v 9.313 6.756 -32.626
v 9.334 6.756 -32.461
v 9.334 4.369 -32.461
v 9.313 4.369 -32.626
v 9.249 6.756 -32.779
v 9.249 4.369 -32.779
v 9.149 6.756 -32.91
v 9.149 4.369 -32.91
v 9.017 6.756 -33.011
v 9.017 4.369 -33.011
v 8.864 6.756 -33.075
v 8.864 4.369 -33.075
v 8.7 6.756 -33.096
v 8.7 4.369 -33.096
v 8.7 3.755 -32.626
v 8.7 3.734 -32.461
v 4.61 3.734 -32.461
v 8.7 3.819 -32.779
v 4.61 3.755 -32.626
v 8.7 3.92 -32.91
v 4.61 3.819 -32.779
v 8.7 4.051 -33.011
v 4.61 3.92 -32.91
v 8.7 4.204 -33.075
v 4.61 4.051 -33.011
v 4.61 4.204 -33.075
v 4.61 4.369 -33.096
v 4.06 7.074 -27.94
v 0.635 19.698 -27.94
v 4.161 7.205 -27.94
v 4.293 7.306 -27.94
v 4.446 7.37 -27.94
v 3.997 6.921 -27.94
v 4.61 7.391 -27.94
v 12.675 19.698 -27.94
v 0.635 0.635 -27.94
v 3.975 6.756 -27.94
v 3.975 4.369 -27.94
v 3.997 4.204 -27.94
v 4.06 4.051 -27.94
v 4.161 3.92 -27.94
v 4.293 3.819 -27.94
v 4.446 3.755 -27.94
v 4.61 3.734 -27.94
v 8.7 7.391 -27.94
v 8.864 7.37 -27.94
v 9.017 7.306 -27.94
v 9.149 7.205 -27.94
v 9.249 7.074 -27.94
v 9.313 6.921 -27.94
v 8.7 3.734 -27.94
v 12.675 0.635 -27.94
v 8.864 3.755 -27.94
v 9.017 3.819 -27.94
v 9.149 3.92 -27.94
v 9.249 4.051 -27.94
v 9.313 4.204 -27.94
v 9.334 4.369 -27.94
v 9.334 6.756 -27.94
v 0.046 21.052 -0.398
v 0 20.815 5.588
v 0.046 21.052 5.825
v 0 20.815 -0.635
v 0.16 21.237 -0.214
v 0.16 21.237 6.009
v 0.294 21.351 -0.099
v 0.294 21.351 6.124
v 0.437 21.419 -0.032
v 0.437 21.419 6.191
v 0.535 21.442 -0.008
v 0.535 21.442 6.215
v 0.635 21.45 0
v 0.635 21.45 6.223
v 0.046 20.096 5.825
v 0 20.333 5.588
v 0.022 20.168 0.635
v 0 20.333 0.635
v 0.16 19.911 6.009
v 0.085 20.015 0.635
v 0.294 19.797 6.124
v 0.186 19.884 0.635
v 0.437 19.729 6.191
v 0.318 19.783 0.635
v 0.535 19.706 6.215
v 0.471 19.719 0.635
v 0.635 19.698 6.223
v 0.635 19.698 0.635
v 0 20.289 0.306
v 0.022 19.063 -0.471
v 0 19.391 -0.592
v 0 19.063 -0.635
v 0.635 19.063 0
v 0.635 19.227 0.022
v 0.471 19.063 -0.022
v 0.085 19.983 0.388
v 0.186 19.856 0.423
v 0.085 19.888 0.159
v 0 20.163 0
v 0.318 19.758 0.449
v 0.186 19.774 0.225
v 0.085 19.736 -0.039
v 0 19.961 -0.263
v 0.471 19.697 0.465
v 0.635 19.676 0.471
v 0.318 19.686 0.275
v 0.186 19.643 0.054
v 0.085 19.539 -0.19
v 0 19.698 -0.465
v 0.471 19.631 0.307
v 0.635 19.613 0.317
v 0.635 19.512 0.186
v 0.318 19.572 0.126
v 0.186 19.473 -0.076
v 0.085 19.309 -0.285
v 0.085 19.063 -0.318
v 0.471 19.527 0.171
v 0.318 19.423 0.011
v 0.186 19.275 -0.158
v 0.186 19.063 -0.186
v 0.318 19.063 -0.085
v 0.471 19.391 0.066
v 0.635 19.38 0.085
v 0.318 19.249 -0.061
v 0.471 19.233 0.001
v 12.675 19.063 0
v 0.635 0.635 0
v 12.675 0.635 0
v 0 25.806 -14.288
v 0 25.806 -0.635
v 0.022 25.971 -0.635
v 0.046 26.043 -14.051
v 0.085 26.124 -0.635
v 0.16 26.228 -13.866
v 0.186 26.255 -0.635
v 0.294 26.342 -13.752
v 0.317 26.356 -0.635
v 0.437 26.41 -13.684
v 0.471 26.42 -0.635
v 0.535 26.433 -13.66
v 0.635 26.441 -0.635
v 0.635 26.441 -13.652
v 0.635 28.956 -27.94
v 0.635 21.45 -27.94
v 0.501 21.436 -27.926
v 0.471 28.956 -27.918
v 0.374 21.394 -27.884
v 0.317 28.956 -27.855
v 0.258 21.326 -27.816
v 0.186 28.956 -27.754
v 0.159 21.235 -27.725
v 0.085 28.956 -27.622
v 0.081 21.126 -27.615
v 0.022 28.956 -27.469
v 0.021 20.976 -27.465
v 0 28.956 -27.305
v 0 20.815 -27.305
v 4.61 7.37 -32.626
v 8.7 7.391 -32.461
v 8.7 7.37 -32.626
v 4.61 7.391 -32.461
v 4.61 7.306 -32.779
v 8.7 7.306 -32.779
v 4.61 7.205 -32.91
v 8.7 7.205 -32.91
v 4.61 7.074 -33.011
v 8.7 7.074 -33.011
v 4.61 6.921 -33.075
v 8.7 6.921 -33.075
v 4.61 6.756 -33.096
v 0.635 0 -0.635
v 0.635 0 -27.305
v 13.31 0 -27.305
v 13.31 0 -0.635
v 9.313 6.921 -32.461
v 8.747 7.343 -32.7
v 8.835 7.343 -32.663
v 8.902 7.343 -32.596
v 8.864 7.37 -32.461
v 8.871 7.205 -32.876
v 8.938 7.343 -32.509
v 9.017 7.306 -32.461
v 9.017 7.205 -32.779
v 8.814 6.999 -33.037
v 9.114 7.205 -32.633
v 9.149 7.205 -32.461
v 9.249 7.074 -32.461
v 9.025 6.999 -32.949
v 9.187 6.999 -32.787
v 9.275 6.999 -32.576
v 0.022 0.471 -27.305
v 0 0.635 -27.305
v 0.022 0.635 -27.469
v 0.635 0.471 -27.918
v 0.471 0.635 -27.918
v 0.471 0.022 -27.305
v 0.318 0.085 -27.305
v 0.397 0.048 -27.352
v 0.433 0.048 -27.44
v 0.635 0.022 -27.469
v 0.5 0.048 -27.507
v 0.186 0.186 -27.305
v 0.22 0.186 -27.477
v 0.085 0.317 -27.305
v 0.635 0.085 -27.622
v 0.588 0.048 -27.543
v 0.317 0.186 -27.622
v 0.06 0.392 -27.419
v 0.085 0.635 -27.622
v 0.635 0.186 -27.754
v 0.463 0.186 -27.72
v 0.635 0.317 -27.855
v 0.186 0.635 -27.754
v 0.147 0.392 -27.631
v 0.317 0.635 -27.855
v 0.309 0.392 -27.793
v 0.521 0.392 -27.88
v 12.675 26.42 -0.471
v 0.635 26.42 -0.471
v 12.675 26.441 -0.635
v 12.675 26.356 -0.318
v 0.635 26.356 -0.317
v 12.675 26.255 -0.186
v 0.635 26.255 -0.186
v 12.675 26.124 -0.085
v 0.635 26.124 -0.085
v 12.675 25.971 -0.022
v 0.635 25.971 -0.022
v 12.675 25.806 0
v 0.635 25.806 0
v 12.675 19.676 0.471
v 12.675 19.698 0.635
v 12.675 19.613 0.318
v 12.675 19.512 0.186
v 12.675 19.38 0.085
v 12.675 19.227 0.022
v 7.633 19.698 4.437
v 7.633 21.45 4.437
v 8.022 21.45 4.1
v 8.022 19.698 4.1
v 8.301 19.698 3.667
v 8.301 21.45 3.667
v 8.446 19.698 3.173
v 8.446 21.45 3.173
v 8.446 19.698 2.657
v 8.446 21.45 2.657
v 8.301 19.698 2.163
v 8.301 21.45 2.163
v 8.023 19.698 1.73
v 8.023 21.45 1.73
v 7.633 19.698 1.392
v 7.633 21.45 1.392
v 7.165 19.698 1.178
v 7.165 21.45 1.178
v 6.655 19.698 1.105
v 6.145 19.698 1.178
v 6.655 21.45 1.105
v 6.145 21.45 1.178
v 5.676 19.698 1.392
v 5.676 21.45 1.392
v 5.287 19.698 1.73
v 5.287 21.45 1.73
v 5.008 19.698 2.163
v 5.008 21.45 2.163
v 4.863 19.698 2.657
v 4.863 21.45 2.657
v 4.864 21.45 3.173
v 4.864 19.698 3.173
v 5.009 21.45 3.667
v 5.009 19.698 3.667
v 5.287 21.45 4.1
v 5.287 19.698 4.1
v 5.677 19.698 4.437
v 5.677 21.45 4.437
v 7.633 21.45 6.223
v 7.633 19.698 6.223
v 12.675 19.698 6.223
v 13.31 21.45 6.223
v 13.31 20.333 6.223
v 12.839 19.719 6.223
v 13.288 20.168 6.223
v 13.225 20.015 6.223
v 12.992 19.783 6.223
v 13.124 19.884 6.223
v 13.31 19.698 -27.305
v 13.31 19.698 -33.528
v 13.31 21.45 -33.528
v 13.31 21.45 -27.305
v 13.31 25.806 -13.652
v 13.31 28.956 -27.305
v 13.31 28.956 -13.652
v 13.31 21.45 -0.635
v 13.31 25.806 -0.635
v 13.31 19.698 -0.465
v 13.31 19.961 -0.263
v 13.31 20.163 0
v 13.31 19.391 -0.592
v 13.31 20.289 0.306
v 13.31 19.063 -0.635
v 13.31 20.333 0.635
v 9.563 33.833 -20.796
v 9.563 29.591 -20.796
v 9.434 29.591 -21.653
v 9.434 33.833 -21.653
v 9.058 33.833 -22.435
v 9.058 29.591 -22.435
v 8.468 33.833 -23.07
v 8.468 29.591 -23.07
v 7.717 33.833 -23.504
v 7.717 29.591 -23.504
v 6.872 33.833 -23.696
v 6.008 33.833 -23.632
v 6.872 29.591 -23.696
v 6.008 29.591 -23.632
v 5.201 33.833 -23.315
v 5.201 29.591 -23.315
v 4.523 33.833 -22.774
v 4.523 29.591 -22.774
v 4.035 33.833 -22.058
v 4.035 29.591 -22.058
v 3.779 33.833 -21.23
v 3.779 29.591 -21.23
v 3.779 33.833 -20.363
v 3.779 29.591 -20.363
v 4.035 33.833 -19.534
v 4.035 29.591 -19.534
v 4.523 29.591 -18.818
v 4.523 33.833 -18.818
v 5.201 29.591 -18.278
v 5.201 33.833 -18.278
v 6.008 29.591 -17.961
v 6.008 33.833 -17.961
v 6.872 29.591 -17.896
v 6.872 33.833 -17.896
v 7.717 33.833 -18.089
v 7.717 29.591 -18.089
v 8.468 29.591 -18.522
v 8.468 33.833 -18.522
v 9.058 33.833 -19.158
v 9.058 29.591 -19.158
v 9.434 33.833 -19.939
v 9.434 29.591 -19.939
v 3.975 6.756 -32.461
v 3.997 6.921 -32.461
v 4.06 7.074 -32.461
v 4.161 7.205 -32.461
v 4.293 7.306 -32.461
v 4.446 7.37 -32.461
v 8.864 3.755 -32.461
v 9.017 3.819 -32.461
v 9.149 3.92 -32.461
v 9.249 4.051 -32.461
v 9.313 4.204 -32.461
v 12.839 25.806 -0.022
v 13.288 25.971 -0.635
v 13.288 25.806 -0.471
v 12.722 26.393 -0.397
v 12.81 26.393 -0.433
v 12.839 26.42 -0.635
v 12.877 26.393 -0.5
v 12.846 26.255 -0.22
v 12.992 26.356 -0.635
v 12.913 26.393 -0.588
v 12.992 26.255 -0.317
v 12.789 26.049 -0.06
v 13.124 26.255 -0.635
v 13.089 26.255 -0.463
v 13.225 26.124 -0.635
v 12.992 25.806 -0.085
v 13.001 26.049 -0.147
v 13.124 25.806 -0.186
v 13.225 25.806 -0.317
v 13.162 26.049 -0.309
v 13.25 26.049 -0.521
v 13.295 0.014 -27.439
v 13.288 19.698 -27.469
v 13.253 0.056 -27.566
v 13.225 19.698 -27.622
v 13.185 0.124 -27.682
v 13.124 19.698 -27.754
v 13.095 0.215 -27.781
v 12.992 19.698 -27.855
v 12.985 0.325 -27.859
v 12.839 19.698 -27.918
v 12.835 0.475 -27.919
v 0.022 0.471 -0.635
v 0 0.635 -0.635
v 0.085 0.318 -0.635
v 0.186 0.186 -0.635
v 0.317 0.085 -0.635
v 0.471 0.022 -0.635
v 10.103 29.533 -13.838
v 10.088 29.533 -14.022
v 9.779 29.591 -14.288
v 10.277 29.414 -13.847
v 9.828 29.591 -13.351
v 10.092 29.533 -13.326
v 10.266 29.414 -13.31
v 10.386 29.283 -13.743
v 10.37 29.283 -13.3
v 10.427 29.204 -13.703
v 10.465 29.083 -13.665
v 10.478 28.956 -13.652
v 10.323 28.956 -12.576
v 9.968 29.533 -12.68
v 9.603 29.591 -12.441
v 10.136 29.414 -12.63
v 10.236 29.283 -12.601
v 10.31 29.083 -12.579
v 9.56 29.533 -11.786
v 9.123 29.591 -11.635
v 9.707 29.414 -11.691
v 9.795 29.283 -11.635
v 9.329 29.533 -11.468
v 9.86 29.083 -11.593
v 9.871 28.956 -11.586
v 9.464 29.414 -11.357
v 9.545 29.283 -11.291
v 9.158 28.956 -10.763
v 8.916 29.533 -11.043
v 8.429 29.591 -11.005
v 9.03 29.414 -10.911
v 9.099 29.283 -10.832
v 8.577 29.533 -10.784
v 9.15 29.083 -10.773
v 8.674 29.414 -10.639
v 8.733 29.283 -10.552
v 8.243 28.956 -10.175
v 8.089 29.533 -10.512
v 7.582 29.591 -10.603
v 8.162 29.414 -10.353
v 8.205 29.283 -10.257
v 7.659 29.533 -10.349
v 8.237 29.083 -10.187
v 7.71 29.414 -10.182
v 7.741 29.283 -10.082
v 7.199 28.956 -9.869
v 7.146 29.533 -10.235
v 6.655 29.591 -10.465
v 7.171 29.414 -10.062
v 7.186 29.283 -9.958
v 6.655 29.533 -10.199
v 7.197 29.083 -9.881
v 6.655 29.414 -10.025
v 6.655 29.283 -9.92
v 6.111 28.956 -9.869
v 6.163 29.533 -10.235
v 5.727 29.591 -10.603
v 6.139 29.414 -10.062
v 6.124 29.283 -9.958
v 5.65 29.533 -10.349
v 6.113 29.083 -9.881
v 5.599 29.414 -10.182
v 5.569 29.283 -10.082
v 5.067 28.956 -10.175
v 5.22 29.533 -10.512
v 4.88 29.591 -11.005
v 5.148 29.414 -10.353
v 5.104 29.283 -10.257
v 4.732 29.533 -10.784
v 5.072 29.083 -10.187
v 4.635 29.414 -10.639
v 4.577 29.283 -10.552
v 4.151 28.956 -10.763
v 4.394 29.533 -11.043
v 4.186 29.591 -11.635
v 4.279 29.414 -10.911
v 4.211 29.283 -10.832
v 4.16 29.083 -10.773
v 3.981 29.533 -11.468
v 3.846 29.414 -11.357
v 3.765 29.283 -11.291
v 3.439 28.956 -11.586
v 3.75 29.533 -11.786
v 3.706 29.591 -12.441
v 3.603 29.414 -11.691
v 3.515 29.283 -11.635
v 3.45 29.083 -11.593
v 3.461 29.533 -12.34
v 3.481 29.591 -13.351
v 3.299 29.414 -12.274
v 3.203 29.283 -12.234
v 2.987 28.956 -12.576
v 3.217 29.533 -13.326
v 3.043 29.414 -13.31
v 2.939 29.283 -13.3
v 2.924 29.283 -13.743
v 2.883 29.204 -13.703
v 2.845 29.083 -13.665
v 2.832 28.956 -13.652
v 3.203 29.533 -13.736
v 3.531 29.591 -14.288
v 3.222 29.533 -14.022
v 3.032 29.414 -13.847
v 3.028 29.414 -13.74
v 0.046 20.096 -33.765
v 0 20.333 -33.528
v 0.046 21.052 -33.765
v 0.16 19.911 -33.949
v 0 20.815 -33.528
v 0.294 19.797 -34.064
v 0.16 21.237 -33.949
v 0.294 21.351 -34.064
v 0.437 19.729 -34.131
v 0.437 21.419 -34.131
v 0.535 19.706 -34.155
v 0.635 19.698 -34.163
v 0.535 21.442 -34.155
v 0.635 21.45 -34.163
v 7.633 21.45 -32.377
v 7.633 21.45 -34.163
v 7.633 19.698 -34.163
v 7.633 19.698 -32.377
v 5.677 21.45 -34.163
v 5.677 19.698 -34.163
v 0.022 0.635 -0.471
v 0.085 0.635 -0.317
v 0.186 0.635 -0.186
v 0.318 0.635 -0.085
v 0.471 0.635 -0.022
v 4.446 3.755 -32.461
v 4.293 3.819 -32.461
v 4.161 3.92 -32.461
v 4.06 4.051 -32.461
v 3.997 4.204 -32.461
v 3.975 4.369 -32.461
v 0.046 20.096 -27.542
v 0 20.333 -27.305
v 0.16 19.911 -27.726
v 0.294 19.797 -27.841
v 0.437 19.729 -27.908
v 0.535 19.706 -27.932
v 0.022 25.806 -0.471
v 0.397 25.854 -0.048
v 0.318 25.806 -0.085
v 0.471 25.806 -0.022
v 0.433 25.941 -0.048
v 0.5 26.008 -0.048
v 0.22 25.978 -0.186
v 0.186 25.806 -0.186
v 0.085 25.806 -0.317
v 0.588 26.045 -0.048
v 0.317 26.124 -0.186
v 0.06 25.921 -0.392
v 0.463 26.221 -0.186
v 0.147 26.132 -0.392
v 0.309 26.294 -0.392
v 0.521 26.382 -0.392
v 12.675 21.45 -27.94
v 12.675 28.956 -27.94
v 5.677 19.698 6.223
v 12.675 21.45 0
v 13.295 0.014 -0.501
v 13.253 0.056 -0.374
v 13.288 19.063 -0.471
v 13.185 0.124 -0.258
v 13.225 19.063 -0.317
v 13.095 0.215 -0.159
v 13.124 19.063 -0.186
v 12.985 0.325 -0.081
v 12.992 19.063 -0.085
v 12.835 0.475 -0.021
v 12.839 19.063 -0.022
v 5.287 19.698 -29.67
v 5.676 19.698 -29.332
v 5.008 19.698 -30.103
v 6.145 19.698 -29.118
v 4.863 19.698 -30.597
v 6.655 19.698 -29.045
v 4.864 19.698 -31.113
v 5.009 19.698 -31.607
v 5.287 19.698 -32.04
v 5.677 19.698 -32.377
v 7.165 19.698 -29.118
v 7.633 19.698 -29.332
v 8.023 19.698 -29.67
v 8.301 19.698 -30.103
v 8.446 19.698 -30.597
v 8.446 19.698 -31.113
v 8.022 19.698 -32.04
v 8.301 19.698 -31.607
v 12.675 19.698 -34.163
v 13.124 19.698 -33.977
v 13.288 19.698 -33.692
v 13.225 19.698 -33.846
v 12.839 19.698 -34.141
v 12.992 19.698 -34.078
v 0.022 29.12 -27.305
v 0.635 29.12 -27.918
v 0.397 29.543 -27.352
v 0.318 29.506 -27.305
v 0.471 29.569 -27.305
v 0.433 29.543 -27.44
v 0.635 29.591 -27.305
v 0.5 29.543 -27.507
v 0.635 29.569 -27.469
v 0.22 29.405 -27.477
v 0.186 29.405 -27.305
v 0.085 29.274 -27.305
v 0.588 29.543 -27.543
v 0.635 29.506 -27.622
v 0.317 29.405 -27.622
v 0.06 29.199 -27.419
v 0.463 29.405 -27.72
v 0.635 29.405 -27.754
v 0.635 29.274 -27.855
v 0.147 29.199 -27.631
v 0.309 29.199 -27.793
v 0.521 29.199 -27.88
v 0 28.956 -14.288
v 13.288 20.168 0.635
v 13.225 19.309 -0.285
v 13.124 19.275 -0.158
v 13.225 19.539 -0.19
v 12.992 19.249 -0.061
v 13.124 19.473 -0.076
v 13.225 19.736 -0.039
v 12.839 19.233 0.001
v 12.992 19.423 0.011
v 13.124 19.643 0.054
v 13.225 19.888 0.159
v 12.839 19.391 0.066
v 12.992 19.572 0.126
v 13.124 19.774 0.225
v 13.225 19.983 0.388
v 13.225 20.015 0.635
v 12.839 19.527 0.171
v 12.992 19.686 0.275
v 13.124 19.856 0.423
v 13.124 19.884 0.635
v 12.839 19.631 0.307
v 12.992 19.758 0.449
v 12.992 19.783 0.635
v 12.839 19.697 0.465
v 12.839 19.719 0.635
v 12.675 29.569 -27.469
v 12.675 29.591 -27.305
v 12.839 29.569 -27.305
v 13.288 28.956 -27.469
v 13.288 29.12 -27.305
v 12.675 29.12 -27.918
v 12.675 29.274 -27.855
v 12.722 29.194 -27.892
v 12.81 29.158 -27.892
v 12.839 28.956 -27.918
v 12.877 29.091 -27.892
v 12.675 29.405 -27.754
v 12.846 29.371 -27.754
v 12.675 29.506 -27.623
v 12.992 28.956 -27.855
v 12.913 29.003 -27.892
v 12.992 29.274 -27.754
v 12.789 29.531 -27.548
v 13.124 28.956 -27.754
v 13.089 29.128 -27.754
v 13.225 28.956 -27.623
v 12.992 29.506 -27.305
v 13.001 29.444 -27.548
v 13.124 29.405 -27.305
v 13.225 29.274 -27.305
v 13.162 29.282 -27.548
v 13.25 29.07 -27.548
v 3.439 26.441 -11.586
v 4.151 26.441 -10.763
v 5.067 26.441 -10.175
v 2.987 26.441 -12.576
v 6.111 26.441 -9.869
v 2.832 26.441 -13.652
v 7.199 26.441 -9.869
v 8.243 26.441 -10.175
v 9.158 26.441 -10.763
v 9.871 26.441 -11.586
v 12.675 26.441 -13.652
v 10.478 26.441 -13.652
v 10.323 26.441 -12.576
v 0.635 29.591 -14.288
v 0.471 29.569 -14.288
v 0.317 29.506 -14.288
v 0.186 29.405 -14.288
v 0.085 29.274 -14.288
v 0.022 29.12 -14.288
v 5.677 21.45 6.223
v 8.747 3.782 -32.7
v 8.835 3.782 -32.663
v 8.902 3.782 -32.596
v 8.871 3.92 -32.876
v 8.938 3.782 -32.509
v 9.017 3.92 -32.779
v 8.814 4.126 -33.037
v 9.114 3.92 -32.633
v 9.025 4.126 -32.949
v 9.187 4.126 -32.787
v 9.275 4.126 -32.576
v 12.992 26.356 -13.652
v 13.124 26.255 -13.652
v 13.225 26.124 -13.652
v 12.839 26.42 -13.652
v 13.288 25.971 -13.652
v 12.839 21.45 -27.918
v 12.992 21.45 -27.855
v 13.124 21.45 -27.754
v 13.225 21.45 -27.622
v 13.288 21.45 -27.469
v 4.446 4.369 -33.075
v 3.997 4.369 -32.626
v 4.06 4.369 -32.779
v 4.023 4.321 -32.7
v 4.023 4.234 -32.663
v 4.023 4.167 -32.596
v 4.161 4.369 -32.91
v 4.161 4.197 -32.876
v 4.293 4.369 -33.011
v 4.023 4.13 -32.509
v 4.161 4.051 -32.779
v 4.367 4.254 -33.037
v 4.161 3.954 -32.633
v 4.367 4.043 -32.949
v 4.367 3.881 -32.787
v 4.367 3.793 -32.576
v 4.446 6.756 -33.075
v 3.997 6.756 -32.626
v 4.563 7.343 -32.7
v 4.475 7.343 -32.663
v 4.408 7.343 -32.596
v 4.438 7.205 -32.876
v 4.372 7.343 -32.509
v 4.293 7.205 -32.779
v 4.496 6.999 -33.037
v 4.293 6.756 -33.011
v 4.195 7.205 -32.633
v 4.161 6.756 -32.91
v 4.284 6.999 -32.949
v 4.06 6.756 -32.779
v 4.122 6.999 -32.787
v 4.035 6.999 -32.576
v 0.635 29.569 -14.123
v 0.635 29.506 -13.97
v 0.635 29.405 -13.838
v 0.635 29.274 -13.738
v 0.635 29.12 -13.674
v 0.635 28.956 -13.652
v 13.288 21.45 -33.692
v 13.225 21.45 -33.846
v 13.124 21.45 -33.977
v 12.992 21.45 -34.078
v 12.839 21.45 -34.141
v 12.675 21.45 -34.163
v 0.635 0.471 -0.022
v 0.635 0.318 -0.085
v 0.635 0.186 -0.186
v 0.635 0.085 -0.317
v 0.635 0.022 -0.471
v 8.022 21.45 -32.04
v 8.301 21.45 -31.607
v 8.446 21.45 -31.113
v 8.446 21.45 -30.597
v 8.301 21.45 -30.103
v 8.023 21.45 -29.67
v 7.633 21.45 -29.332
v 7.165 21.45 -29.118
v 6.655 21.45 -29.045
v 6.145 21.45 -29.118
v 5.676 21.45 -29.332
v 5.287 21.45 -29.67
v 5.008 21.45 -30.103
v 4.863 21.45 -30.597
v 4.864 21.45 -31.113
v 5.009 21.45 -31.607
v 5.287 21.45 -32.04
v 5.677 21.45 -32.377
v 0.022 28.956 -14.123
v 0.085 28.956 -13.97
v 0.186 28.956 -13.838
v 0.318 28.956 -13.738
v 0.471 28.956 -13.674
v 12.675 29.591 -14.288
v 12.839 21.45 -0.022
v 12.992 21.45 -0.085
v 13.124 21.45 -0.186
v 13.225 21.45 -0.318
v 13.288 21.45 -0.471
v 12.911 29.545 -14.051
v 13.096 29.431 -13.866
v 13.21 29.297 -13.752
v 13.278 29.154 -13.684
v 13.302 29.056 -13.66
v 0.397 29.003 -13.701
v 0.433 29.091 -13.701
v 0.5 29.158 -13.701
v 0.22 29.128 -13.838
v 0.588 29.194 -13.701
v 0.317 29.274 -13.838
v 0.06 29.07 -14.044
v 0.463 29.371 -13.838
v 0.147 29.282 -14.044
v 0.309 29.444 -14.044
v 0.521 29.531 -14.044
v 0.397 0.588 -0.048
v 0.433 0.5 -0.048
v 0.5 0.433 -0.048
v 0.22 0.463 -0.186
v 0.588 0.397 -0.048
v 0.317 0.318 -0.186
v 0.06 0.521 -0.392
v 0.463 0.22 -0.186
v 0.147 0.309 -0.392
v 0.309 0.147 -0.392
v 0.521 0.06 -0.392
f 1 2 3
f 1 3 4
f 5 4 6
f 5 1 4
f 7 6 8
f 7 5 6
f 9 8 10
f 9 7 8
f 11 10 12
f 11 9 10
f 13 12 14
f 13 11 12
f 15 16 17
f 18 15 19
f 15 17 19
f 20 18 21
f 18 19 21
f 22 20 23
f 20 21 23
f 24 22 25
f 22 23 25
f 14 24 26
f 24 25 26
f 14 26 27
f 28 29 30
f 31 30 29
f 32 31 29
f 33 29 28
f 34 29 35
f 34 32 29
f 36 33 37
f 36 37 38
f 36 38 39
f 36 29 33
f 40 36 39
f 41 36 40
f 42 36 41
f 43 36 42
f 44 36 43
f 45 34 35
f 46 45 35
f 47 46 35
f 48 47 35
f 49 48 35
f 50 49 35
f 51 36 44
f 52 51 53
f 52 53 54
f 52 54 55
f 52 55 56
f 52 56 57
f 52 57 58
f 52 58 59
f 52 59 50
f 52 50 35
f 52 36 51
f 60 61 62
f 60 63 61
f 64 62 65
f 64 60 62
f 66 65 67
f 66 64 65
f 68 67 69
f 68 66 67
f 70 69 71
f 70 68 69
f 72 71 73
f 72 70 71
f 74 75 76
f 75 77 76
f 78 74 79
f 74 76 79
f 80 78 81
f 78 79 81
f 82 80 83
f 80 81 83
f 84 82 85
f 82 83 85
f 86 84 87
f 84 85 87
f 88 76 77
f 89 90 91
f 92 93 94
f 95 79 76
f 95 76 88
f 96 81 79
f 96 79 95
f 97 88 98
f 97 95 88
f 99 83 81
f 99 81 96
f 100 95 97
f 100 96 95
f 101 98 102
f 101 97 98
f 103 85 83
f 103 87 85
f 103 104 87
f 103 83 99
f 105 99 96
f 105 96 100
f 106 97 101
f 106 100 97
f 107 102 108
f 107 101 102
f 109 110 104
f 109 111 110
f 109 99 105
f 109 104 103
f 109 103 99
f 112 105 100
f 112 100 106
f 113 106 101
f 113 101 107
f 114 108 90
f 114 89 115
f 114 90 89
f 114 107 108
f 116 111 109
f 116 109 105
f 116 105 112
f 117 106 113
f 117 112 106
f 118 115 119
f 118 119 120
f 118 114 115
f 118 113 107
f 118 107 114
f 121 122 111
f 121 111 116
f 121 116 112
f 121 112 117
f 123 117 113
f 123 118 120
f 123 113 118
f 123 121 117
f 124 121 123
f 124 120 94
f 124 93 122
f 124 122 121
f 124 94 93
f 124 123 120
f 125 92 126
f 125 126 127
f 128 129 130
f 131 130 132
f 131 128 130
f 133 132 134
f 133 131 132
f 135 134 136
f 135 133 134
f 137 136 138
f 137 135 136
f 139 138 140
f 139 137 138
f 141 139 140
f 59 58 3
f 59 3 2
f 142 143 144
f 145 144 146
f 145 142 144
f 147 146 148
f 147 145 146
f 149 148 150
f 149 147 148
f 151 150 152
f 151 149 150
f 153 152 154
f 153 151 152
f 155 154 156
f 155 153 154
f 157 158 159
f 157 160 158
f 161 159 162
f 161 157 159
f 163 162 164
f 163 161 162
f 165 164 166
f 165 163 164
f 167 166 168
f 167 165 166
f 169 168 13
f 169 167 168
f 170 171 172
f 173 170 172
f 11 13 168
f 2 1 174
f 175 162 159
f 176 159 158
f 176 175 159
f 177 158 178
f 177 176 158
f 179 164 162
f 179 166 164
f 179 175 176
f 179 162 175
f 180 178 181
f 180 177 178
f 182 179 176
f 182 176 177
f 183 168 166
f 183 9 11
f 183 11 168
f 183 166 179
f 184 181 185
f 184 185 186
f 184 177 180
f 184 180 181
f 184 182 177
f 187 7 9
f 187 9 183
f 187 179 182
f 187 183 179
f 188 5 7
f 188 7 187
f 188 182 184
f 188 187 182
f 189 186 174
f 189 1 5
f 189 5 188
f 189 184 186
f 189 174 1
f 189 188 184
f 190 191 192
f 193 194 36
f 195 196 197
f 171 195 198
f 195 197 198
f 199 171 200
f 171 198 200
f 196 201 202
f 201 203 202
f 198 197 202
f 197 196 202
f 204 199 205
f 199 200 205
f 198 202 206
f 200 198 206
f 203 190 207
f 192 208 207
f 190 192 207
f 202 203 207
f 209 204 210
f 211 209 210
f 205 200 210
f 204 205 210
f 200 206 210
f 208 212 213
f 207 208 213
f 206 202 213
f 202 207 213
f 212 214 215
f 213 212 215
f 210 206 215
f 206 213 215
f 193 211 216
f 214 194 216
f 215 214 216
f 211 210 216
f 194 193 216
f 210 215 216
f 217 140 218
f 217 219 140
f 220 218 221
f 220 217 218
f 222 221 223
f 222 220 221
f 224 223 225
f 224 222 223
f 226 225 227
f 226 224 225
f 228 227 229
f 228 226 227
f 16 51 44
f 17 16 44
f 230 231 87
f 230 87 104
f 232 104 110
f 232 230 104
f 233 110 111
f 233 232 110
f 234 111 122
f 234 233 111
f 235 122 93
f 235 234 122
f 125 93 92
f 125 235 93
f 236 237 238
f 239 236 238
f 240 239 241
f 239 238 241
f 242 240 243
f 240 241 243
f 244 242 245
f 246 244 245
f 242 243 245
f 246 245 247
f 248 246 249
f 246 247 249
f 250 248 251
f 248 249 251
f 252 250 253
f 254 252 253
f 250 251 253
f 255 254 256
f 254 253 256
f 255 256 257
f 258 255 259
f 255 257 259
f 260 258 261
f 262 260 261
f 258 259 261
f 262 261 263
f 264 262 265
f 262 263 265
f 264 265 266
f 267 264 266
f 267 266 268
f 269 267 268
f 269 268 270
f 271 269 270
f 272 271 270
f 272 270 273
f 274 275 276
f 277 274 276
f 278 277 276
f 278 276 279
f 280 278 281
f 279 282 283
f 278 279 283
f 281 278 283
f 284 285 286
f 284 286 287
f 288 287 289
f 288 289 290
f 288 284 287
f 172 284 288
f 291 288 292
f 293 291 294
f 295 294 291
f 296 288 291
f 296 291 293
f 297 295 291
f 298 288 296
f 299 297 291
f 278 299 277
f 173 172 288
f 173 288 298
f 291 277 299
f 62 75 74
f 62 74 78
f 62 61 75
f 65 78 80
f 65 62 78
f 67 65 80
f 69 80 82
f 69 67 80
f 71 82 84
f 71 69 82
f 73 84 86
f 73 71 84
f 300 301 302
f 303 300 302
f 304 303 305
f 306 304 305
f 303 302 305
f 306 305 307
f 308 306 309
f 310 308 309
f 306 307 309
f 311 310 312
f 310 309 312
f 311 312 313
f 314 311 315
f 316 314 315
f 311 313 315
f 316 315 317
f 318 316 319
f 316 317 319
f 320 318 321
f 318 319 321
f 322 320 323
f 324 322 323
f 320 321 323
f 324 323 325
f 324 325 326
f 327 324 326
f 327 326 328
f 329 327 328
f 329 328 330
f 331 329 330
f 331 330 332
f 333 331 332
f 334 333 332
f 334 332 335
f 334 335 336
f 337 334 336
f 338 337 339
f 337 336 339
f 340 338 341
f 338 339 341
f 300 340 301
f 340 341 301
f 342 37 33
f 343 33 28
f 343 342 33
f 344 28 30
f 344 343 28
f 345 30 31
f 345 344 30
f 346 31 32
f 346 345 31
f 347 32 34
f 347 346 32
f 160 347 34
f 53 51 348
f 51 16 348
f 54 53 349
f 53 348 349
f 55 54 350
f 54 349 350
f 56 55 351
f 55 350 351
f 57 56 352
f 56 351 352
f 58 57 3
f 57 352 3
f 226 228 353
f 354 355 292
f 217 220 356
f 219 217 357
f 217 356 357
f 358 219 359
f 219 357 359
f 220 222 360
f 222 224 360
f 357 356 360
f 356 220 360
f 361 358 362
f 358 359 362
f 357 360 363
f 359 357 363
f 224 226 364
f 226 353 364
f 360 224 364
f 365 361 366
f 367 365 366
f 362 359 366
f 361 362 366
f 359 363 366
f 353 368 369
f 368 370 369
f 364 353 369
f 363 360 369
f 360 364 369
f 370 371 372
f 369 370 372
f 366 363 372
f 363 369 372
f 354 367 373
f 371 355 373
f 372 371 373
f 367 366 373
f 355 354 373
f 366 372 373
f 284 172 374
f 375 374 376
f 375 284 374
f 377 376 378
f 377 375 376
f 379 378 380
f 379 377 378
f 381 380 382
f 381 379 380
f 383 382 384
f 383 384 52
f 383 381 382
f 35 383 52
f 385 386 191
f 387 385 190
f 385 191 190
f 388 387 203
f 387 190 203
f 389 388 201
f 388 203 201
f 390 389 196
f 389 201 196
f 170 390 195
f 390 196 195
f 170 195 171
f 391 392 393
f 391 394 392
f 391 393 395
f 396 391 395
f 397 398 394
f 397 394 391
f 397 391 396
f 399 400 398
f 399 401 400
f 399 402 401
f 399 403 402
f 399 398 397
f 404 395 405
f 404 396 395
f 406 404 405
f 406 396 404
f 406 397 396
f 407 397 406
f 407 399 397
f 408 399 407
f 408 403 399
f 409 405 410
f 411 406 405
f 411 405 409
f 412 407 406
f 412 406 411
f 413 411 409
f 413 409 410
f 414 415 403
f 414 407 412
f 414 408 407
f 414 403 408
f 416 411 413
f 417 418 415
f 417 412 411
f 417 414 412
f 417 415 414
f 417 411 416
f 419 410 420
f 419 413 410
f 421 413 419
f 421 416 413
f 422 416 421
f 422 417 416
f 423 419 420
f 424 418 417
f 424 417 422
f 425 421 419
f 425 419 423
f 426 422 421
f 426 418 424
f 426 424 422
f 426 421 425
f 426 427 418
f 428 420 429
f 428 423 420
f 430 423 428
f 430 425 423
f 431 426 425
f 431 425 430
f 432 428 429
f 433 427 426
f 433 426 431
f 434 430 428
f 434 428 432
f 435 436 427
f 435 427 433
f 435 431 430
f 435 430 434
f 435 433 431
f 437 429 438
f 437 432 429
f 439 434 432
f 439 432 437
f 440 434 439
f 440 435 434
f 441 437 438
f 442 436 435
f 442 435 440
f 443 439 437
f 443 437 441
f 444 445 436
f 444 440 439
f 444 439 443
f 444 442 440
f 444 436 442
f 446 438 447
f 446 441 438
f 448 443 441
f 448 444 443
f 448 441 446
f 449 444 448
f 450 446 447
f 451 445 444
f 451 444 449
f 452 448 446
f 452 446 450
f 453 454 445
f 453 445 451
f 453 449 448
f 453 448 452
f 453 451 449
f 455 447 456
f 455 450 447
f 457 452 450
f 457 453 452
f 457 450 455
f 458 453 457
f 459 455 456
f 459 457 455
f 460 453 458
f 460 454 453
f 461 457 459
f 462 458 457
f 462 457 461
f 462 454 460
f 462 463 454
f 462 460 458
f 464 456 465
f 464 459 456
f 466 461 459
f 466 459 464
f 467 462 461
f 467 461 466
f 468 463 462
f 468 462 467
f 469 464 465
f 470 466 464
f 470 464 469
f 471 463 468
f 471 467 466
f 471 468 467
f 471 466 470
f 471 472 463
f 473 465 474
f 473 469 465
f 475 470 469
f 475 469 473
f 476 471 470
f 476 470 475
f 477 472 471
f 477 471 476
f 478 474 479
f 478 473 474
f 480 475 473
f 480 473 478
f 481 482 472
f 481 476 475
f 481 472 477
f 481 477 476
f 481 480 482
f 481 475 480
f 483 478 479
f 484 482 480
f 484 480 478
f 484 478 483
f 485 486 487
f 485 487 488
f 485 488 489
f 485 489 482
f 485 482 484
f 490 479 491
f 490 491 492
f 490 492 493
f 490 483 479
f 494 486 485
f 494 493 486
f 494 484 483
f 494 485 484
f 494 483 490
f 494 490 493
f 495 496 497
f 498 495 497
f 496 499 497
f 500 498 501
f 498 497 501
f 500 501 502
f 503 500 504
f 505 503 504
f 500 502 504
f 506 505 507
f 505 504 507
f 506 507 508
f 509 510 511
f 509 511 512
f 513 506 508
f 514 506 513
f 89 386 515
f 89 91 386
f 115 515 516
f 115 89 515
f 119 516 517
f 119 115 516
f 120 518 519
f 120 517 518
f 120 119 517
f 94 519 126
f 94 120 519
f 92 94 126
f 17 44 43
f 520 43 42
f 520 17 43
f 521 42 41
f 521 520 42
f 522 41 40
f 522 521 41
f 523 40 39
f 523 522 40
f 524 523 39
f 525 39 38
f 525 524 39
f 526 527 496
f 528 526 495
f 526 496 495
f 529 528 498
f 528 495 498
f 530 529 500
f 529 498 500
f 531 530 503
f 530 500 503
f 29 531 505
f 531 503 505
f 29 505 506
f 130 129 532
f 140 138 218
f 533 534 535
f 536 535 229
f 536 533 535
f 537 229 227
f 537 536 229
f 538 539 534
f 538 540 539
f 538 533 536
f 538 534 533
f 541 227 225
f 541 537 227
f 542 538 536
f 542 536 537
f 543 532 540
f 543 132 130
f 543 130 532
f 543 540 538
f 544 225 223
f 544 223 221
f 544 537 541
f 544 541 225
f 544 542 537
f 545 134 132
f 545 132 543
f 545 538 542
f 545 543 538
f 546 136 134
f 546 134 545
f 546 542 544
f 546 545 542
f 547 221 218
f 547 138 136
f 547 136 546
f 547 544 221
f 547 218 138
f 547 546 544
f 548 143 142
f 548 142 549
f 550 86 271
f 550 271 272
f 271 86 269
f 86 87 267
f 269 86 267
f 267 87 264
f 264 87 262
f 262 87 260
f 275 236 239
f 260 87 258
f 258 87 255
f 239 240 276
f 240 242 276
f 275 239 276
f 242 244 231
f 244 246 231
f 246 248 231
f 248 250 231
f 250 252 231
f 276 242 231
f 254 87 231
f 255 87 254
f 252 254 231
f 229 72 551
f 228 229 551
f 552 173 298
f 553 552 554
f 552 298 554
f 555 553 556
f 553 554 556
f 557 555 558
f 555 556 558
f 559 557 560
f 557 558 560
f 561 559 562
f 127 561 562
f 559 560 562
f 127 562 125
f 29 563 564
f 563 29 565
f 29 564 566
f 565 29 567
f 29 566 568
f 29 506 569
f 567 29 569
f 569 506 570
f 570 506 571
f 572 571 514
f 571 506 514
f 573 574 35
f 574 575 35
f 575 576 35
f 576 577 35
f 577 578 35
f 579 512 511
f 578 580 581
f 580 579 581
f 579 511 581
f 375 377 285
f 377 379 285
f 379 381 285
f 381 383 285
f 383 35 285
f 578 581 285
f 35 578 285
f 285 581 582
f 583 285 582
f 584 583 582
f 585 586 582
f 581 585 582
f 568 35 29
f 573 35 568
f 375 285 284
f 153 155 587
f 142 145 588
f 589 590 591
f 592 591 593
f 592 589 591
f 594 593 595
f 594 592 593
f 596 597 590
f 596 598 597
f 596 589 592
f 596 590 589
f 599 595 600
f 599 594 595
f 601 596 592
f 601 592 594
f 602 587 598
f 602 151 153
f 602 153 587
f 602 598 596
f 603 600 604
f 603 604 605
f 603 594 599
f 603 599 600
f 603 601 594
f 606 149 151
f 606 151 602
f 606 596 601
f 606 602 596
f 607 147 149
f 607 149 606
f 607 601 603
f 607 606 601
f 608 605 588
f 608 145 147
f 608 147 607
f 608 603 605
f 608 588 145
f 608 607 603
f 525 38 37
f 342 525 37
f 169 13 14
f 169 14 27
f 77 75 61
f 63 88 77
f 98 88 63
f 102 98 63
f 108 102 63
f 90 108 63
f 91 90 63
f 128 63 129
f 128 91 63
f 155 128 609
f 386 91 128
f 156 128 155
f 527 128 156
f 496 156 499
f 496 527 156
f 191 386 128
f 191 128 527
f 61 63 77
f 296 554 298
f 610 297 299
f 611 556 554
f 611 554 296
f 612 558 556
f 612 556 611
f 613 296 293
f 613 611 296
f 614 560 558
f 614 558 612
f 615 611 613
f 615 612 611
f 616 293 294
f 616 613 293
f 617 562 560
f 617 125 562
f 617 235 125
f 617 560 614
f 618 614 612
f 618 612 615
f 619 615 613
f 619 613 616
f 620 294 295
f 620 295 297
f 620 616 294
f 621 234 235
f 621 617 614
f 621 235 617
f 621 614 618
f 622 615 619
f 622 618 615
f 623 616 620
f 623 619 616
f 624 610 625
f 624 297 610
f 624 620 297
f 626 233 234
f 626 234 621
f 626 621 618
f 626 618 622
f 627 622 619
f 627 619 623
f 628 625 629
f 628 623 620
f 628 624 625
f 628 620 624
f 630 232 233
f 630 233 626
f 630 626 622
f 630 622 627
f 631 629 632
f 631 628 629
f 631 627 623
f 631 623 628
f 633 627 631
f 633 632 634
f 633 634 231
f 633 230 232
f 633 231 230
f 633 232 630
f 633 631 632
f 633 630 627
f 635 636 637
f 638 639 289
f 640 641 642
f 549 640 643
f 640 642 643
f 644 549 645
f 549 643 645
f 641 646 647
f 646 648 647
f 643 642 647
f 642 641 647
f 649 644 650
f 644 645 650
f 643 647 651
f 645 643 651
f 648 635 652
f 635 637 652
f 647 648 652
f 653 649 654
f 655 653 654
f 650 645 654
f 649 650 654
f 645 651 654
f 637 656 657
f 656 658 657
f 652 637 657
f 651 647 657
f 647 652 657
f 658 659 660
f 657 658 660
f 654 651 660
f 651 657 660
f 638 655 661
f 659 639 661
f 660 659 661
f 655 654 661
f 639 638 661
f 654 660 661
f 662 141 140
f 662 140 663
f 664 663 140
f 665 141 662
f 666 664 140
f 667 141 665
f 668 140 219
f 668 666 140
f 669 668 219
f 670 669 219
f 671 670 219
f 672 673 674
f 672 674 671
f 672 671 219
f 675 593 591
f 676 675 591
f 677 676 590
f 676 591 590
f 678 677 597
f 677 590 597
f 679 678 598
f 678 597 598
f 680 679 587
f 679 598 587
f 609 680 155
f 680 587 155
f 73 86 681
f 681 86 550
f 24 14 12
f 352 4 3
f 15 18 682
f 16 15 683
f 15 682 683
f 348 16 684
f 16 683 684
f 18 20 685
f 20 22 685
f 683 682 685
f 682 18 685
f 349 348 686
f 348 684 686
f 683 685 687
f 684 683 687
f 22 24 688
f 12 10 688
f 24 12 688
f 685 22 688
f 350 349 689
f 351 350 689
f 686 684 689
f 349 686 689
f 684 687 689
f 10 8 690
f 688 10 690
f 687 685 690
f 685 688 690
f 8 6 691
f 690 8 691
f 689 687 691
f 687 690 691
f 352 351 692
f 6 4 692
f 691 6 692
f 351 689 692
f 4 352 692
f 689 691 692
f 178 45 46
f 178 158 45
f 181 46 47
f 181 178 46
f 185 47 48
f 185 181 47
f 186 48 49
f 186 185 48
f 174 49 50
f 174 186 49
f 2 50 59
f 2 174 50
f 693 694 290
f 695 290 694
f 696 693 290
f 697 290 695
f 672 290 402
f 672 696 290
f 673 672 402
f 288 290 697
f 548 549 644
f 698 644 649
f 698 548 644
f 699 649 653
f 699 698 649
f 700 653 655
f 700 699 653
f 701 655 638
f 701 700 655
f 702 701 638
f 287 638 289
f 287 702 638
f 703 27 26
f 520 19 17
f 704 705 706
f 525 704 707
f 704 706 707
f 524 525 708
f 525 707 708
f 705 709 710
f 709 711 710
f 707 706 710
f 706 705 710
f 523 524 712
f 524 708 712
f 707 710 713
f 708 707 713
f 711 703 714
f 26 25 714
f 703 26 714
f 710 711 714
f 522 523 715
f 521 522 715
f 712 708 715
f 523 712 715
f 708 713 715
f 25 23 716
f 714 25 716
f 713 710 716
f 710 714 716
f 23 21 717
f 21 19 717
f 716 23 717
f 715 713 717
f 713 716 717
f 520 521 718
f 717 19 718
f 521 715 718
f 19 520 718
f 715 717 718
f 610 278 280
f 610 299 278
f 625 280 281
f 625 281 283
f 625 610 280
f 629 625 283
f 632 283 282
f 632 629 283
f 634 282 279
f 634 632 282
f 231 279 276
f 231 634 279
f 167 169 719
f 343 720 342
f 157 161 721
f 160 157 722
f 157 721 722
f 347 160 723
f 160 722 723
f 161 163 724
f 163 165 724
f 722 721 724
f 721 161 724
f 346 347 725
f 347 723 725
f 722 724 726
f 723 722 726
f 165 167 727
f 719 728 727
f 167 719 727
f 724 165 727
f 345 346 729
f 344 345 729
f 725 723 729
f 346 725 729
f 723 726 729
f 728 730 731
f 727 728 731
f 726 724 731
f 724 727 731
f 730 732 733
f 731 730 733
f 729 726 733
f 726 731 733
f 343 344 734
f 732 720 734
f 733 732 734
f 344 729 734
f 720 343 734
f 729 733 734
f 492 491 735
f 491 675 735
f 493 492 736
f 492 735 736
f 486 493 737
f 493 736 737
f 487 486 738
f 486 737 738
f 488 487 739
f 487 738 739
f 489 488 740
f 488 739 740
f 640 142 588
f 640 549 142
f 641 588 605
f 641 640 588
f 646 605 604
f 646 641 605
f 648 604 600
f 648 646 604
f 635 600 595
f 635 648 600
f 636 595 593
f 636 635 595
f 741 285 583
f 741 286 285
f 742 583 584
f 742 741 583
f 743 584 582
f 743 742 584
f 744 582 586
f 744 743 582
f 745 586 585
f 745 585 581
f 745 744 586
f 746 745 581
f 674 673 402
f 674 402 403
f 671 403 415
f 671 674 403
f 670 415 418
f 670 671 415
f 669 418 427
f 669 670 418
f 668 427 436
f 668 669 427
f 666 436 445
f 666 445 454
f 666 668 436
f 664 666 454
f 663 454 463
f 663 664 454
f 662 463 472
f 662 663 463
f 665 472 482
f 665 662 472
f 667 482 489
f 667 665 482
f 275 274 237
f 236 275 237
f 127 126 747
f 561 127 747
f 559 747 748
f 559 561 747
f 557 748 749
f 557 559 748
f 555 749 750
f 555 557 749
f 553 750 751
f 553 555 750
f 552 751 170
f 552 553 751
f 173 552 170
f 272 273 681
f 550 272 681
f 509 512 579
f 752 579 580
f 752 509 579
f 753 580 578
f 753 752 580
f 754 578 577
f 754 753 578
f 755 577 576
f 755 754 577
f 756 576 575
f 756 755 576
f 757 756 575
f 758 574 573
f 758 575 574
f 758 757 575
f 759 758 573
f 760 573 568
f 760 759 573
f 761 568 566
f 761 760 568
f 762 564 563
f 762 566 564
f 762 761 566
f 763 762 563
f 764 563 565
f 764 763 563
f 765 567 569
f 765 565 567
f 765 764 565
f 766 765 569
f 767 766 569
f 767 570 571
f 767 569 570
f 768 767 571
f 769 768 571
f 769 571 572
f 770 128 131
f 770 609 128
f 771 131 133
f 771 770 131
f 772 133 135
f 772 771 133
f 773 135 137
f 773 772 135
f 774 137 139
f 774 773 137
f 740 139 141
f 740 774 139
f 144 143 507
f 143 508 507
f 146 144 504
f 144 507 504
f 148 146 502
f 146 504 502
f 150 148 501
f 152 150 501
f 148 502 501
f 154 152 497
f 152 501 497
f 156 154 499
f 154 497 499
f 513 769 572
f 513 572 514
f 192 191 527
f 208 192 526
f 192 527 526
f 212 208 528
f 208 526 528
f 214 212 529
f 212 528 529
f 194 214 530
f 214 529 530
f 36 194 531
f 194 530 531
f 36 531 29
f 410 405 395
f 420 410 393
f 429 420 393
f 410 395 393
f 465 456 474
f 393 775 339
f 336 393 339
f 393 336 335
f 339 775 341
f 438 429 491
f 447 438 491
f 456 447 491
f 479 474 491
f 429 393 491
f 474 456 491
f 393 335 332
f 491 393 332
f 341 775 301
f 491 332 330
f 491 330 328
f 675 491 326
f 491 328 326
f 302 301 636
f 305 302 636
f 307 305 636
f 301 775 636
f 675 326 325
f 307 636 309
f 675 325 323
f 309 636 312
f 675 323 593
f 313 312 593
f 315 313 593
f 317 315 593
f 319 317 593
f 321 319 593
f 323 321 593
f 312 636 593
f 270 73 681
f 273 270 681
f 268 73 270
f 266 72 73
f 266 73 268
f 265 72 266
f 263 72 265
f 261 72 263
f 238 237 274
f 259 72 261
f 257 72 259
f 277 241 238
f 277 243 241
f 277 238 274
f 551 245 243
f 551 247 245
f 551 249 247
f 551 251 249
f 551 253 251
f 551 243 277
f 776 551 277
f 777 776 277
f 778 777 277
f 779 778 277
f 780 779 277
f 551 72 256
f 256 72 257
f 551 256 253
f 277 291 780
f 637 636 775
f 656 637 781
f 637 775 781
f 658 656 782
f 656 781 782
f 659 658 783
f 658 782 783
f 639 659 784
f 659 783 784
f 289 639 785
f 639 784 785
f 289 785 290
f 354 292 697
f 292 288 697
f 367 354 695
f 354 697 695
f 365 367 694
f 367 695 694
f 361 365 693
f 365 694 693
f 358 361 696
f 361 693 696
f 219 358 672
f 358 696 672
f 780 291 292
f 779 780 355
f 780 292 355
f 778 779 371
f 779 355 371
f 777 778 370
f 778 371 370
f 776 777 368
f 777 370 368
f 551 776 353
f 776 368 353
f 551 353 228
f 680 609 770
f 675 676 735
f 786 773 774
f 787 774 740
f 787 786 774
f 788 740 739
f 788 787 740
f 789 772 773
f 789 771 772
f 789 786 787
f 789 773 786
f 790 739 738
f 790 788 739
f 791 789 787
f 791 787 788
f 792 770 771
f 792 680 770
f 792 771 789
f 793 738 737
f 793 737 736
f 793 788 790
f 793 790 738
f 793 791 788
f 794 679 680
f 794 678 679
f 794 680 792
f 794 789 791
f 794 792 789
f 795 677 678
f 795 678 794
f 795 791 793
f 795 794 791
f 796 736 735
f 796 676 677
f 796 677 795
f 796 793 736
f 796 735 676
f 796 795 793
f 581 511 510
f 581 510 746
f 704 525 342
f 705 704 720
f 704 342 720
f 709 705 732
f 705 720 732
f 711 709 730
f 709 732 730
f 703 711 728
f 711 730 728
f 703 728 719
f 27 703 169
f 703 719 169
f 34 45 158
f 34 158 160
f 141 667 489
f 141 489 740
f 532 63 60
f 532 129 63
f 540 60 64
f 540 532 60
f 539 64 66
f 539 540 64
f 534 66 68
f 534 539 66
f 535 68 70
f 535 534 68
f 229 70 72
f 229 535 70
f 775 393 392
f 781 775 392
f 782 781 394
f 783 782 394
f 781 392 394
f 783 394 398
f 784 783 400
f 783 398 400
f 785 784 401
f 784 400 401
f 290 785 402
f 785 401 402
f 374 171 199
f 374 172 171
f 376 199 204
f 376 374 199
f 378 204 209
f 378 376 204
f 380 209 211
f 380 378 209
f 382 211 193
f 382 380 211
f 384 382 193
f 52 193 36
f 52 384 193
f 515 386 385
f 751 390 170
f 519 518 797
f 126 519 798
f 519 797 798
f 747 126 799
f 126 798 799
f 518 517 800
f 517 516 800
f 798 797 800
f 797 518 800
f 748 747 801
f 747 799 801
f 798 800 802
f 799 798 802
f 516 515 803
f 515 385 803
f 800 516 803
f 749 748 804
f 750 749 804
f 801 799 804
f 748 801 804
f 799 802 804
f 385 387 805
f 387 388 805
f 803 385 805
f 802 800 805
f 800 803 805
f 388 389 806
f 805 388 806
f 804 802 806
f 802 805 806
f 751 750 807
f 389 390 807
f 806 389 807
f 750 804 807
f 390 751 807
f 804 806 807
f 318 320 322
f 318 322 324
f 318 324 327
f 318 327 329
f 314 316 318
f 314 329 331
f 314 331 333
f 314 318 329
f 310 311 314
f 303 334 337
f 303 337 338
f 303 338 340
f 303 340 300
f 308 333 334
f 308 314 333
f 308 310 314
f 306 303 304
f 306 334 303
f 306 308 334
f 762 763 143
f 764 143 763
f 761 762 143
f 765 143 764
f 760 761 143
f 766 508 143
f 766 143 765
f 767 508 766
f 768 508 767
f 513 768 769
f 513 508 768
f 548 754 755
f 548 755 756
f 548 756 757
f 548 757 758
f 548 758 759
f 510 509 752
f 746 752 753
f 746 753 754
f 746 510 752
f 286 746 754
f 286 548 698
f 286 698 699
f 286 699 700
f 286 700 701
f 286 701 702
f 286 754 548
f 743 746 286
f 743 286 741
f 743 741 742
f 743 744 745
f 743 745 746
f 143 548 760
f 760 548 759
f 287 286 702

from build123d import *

# Parameters (mm, degrees)
BASE_SKETCH_W           = 13.3096
BASE_SKETCH_H           = 27.94
BASE_DEPTH              = 19.6977
MOUNTING_POINT_SKETCH_W = 13.3096
MOUNTING_POINT_SKETCH_H = 40.386
MOUNTING_POINT_DEPTH    = 1.7526
MOUNTING_HOLES_DEPTH    = 22.4503
MIDDLE_SKETCH_W         = 13.3096
MIDDLE_SKETCH_H         = 27.94
MIDDLE_DEPTH            = 4.9911
TOP_EXTRUDE_DEPTH       = 3.1496
GEAR_SKETCH_R           = 2.9083
GEAR_DEPTH              = 4.2418
SERVO_CABLE_SKETCH_W    = 5.3594
SERVO_CABLE_SKETCH_H    = 3.6576
SEVO_CABLE_DEPTH        = 5.1562
FILLET1_R               = 0.635


with BuildPart() as part:
    # Base Sketch → Base (new body)
    with BuildSketch(Plane(origin=(0, 0, 0), x_dir=(1, 0, 0), z_dir=(0, 1, 0))):
        with Locations((6.6548, 13.97)):
            Rectangle(BASE_SKETCH_W, BASE_SKETCH_H)
    extrude(amount=BASE_DEPTH)

    # Mounting Point Sketch → Mounting Point (add)
    with BuildSketch(Plane(origin=(0, 19.6977, 0), x_dir=(1, 0, 0), z_dir=(0, 1, 0))):
        with Locations((6.6548, 13.97)):
            Rectangle(MOUNTING_POINT_SKETCH_W, MOUNTING_POINT_SKETCH_H)
    extrude(amount=MOUNTING_POINT_DEPTH)

    # Mounting Holes Sketch → Mounting Holes (cut, through all)
    with BuildSketch(Plane(origin=(0, 21.4503, 0), x_dir=(1, 0, 0), z_dir=(0, 1, 0))):
        with BuildLine():
            Line((5.6769, 34.163), (7.6327, 34.163))
            Line((7.6327, 34.163), (7.6327, 32.37744567))
            ThreePointArc((7.6327, 32.37744567), (6.6548, 29.0449), (5.6769, 32.37744567))
            Line((5.6769, 32.37744567), (5.6769, 34.163))
        make_face()
        with BuildLine():
            Line((5.6769, -6.223), (7.6327, -6.223))
            Line((7.6327, -6.223), (7.6327, -4.43744567))
            ThreePointArc((7.6327, -4.43744567), (6.6548, -1.1049), (5.6769, -4.43744567))
            Line((5.6769, -4.43744567), (5.6769, -6.223))
        make_face()
    extrude(amount=-MOUNTING_HOLES_DEPTH, mode=Mode.SUBTRACT)

    # Middle Sketch → Middle (add)
    with BuildSketch(Plane(origin=(0, 21.4503, 0), x_dir=(1, 0, 0), z_dir=(0, 1, 0))):
        with Locations((6.6548, 13.97)):
            Rectangle(MIDDLE_SKETCH_W, MIDDLE_SKETCH_H)
    extrude(amount=MIDDLE_DEPTH)

    # Top Sketch → Top extrude (add)
    with BuildSketch(Plane(origin=(0, 26.4414, 0), x_dir=(1, 0, 0), z_dir=(0, 1, 0))):
        with BuildLine():
            Line((0, 27.94), (13.3096, 27.94))
            Line((13.3096, 27.94), (13.3096, 13.6525))
            Line((13.3096, 13.6525), (10.4775, 13.6525))
            ThreePointArc((10.4775, 13.6525), (6.6548, 9.8298), (2.8321, 13.6525))
            Line((2.8321, 13.6525), (0, 13.6525))
            Line((0, 13.6525), (0, 27.94))
        make_face()
    extrude(amount=TOP_EXTRUDE_DEPTH)

    # Gear Sketch → Gear (add)
    with BuildSketch(Plane(origin=(0, 29.591, 0), x_dir=(1, 0, 0), z_dir=(0, 1, 0))):
        with Locations((6.6548, 20.79625)):
            Circle(GEAR_SKETCH_R)
    extrude(amount=GEAR_DEPTH)

    # Servo Cable Sketch → Sevo Cable (add)
    with BuildSketch(Plane(origin=(0, 0, -27.94), x_dir=(-1, 0, 0), z_dir=(0, 0, -1))):
        with Locations((-6.6548, 5.5626)):
            Rectangle(SERVO_CABLE_SKETCH_W, SERVO_CABLE_SKETCH_H)
    extrude(amount=SEVO_CABLE_DEPTH)

    # Fillet1
    fillet1_edges = [part.edges().sort_by_distance(p)[0] for p in [
        (13.3096, 19.6977, 3.1115),
        (0, 9.84885, -27.94),
        (0, 19.6977, -31.0515),
        (0, 20.574, -34.163),
        (0, 21.4503, -31.0515),
        (0, 25.52065, -27.94),
        (0, 29.591, -20.79625),
        (0, 28.0162, -13.6525),
        (0, 26.4414, -6.82625),
        (0, 23.94585, 0),
        (0, 21.4503, 3.1115),
        (0, 20.574, 6.223),
        (0, 19.6977, 3.1115),
        (0, 0, -13.97),
        (0, 9.84885, 0),
        (6.6548, 19.6977, 0),
        (13.3096, 9.84885, 0),
        (6.6548, 0, 0),
        (9.3345, 5.5626, -33.0962),
        (6.6548, 3.7338, -33.0962),
        (3.9751, 5.5626, -33.0962),
        (6.6548, 7.3914, -33.0962),
        (3.9751, 7.3914, -30.5181),
        (3.9751, 3.7338, -30.5181),
        (9.3345, 3.7338, -30.5181),
        (9.3345, 7.3914, -30.5181),
        (6.6548, 0, -27.94),
        (13.3096, 9.84885, -27.94),
        (13.3096, 29.591, -20.79625),
        (13.3096, 23.94585, 0),
        (6.6548, 26.4414, 0),
        (13.3096, 26.4414, -6.82625),
        (11.89355, 29.591, -13.6525),
        (1.41605, 29.591, -13.6525),
        (6.6548, 29.591, -9.8298),
        (6.6548, 29.591, -27.94),
        (13.3096, 25.52065, -27.94),
        (13.3096, 20.574, -34.163),
    ]]
    fillet(fillet1_edges, radius=FILLET1_R)


solid = part.part
